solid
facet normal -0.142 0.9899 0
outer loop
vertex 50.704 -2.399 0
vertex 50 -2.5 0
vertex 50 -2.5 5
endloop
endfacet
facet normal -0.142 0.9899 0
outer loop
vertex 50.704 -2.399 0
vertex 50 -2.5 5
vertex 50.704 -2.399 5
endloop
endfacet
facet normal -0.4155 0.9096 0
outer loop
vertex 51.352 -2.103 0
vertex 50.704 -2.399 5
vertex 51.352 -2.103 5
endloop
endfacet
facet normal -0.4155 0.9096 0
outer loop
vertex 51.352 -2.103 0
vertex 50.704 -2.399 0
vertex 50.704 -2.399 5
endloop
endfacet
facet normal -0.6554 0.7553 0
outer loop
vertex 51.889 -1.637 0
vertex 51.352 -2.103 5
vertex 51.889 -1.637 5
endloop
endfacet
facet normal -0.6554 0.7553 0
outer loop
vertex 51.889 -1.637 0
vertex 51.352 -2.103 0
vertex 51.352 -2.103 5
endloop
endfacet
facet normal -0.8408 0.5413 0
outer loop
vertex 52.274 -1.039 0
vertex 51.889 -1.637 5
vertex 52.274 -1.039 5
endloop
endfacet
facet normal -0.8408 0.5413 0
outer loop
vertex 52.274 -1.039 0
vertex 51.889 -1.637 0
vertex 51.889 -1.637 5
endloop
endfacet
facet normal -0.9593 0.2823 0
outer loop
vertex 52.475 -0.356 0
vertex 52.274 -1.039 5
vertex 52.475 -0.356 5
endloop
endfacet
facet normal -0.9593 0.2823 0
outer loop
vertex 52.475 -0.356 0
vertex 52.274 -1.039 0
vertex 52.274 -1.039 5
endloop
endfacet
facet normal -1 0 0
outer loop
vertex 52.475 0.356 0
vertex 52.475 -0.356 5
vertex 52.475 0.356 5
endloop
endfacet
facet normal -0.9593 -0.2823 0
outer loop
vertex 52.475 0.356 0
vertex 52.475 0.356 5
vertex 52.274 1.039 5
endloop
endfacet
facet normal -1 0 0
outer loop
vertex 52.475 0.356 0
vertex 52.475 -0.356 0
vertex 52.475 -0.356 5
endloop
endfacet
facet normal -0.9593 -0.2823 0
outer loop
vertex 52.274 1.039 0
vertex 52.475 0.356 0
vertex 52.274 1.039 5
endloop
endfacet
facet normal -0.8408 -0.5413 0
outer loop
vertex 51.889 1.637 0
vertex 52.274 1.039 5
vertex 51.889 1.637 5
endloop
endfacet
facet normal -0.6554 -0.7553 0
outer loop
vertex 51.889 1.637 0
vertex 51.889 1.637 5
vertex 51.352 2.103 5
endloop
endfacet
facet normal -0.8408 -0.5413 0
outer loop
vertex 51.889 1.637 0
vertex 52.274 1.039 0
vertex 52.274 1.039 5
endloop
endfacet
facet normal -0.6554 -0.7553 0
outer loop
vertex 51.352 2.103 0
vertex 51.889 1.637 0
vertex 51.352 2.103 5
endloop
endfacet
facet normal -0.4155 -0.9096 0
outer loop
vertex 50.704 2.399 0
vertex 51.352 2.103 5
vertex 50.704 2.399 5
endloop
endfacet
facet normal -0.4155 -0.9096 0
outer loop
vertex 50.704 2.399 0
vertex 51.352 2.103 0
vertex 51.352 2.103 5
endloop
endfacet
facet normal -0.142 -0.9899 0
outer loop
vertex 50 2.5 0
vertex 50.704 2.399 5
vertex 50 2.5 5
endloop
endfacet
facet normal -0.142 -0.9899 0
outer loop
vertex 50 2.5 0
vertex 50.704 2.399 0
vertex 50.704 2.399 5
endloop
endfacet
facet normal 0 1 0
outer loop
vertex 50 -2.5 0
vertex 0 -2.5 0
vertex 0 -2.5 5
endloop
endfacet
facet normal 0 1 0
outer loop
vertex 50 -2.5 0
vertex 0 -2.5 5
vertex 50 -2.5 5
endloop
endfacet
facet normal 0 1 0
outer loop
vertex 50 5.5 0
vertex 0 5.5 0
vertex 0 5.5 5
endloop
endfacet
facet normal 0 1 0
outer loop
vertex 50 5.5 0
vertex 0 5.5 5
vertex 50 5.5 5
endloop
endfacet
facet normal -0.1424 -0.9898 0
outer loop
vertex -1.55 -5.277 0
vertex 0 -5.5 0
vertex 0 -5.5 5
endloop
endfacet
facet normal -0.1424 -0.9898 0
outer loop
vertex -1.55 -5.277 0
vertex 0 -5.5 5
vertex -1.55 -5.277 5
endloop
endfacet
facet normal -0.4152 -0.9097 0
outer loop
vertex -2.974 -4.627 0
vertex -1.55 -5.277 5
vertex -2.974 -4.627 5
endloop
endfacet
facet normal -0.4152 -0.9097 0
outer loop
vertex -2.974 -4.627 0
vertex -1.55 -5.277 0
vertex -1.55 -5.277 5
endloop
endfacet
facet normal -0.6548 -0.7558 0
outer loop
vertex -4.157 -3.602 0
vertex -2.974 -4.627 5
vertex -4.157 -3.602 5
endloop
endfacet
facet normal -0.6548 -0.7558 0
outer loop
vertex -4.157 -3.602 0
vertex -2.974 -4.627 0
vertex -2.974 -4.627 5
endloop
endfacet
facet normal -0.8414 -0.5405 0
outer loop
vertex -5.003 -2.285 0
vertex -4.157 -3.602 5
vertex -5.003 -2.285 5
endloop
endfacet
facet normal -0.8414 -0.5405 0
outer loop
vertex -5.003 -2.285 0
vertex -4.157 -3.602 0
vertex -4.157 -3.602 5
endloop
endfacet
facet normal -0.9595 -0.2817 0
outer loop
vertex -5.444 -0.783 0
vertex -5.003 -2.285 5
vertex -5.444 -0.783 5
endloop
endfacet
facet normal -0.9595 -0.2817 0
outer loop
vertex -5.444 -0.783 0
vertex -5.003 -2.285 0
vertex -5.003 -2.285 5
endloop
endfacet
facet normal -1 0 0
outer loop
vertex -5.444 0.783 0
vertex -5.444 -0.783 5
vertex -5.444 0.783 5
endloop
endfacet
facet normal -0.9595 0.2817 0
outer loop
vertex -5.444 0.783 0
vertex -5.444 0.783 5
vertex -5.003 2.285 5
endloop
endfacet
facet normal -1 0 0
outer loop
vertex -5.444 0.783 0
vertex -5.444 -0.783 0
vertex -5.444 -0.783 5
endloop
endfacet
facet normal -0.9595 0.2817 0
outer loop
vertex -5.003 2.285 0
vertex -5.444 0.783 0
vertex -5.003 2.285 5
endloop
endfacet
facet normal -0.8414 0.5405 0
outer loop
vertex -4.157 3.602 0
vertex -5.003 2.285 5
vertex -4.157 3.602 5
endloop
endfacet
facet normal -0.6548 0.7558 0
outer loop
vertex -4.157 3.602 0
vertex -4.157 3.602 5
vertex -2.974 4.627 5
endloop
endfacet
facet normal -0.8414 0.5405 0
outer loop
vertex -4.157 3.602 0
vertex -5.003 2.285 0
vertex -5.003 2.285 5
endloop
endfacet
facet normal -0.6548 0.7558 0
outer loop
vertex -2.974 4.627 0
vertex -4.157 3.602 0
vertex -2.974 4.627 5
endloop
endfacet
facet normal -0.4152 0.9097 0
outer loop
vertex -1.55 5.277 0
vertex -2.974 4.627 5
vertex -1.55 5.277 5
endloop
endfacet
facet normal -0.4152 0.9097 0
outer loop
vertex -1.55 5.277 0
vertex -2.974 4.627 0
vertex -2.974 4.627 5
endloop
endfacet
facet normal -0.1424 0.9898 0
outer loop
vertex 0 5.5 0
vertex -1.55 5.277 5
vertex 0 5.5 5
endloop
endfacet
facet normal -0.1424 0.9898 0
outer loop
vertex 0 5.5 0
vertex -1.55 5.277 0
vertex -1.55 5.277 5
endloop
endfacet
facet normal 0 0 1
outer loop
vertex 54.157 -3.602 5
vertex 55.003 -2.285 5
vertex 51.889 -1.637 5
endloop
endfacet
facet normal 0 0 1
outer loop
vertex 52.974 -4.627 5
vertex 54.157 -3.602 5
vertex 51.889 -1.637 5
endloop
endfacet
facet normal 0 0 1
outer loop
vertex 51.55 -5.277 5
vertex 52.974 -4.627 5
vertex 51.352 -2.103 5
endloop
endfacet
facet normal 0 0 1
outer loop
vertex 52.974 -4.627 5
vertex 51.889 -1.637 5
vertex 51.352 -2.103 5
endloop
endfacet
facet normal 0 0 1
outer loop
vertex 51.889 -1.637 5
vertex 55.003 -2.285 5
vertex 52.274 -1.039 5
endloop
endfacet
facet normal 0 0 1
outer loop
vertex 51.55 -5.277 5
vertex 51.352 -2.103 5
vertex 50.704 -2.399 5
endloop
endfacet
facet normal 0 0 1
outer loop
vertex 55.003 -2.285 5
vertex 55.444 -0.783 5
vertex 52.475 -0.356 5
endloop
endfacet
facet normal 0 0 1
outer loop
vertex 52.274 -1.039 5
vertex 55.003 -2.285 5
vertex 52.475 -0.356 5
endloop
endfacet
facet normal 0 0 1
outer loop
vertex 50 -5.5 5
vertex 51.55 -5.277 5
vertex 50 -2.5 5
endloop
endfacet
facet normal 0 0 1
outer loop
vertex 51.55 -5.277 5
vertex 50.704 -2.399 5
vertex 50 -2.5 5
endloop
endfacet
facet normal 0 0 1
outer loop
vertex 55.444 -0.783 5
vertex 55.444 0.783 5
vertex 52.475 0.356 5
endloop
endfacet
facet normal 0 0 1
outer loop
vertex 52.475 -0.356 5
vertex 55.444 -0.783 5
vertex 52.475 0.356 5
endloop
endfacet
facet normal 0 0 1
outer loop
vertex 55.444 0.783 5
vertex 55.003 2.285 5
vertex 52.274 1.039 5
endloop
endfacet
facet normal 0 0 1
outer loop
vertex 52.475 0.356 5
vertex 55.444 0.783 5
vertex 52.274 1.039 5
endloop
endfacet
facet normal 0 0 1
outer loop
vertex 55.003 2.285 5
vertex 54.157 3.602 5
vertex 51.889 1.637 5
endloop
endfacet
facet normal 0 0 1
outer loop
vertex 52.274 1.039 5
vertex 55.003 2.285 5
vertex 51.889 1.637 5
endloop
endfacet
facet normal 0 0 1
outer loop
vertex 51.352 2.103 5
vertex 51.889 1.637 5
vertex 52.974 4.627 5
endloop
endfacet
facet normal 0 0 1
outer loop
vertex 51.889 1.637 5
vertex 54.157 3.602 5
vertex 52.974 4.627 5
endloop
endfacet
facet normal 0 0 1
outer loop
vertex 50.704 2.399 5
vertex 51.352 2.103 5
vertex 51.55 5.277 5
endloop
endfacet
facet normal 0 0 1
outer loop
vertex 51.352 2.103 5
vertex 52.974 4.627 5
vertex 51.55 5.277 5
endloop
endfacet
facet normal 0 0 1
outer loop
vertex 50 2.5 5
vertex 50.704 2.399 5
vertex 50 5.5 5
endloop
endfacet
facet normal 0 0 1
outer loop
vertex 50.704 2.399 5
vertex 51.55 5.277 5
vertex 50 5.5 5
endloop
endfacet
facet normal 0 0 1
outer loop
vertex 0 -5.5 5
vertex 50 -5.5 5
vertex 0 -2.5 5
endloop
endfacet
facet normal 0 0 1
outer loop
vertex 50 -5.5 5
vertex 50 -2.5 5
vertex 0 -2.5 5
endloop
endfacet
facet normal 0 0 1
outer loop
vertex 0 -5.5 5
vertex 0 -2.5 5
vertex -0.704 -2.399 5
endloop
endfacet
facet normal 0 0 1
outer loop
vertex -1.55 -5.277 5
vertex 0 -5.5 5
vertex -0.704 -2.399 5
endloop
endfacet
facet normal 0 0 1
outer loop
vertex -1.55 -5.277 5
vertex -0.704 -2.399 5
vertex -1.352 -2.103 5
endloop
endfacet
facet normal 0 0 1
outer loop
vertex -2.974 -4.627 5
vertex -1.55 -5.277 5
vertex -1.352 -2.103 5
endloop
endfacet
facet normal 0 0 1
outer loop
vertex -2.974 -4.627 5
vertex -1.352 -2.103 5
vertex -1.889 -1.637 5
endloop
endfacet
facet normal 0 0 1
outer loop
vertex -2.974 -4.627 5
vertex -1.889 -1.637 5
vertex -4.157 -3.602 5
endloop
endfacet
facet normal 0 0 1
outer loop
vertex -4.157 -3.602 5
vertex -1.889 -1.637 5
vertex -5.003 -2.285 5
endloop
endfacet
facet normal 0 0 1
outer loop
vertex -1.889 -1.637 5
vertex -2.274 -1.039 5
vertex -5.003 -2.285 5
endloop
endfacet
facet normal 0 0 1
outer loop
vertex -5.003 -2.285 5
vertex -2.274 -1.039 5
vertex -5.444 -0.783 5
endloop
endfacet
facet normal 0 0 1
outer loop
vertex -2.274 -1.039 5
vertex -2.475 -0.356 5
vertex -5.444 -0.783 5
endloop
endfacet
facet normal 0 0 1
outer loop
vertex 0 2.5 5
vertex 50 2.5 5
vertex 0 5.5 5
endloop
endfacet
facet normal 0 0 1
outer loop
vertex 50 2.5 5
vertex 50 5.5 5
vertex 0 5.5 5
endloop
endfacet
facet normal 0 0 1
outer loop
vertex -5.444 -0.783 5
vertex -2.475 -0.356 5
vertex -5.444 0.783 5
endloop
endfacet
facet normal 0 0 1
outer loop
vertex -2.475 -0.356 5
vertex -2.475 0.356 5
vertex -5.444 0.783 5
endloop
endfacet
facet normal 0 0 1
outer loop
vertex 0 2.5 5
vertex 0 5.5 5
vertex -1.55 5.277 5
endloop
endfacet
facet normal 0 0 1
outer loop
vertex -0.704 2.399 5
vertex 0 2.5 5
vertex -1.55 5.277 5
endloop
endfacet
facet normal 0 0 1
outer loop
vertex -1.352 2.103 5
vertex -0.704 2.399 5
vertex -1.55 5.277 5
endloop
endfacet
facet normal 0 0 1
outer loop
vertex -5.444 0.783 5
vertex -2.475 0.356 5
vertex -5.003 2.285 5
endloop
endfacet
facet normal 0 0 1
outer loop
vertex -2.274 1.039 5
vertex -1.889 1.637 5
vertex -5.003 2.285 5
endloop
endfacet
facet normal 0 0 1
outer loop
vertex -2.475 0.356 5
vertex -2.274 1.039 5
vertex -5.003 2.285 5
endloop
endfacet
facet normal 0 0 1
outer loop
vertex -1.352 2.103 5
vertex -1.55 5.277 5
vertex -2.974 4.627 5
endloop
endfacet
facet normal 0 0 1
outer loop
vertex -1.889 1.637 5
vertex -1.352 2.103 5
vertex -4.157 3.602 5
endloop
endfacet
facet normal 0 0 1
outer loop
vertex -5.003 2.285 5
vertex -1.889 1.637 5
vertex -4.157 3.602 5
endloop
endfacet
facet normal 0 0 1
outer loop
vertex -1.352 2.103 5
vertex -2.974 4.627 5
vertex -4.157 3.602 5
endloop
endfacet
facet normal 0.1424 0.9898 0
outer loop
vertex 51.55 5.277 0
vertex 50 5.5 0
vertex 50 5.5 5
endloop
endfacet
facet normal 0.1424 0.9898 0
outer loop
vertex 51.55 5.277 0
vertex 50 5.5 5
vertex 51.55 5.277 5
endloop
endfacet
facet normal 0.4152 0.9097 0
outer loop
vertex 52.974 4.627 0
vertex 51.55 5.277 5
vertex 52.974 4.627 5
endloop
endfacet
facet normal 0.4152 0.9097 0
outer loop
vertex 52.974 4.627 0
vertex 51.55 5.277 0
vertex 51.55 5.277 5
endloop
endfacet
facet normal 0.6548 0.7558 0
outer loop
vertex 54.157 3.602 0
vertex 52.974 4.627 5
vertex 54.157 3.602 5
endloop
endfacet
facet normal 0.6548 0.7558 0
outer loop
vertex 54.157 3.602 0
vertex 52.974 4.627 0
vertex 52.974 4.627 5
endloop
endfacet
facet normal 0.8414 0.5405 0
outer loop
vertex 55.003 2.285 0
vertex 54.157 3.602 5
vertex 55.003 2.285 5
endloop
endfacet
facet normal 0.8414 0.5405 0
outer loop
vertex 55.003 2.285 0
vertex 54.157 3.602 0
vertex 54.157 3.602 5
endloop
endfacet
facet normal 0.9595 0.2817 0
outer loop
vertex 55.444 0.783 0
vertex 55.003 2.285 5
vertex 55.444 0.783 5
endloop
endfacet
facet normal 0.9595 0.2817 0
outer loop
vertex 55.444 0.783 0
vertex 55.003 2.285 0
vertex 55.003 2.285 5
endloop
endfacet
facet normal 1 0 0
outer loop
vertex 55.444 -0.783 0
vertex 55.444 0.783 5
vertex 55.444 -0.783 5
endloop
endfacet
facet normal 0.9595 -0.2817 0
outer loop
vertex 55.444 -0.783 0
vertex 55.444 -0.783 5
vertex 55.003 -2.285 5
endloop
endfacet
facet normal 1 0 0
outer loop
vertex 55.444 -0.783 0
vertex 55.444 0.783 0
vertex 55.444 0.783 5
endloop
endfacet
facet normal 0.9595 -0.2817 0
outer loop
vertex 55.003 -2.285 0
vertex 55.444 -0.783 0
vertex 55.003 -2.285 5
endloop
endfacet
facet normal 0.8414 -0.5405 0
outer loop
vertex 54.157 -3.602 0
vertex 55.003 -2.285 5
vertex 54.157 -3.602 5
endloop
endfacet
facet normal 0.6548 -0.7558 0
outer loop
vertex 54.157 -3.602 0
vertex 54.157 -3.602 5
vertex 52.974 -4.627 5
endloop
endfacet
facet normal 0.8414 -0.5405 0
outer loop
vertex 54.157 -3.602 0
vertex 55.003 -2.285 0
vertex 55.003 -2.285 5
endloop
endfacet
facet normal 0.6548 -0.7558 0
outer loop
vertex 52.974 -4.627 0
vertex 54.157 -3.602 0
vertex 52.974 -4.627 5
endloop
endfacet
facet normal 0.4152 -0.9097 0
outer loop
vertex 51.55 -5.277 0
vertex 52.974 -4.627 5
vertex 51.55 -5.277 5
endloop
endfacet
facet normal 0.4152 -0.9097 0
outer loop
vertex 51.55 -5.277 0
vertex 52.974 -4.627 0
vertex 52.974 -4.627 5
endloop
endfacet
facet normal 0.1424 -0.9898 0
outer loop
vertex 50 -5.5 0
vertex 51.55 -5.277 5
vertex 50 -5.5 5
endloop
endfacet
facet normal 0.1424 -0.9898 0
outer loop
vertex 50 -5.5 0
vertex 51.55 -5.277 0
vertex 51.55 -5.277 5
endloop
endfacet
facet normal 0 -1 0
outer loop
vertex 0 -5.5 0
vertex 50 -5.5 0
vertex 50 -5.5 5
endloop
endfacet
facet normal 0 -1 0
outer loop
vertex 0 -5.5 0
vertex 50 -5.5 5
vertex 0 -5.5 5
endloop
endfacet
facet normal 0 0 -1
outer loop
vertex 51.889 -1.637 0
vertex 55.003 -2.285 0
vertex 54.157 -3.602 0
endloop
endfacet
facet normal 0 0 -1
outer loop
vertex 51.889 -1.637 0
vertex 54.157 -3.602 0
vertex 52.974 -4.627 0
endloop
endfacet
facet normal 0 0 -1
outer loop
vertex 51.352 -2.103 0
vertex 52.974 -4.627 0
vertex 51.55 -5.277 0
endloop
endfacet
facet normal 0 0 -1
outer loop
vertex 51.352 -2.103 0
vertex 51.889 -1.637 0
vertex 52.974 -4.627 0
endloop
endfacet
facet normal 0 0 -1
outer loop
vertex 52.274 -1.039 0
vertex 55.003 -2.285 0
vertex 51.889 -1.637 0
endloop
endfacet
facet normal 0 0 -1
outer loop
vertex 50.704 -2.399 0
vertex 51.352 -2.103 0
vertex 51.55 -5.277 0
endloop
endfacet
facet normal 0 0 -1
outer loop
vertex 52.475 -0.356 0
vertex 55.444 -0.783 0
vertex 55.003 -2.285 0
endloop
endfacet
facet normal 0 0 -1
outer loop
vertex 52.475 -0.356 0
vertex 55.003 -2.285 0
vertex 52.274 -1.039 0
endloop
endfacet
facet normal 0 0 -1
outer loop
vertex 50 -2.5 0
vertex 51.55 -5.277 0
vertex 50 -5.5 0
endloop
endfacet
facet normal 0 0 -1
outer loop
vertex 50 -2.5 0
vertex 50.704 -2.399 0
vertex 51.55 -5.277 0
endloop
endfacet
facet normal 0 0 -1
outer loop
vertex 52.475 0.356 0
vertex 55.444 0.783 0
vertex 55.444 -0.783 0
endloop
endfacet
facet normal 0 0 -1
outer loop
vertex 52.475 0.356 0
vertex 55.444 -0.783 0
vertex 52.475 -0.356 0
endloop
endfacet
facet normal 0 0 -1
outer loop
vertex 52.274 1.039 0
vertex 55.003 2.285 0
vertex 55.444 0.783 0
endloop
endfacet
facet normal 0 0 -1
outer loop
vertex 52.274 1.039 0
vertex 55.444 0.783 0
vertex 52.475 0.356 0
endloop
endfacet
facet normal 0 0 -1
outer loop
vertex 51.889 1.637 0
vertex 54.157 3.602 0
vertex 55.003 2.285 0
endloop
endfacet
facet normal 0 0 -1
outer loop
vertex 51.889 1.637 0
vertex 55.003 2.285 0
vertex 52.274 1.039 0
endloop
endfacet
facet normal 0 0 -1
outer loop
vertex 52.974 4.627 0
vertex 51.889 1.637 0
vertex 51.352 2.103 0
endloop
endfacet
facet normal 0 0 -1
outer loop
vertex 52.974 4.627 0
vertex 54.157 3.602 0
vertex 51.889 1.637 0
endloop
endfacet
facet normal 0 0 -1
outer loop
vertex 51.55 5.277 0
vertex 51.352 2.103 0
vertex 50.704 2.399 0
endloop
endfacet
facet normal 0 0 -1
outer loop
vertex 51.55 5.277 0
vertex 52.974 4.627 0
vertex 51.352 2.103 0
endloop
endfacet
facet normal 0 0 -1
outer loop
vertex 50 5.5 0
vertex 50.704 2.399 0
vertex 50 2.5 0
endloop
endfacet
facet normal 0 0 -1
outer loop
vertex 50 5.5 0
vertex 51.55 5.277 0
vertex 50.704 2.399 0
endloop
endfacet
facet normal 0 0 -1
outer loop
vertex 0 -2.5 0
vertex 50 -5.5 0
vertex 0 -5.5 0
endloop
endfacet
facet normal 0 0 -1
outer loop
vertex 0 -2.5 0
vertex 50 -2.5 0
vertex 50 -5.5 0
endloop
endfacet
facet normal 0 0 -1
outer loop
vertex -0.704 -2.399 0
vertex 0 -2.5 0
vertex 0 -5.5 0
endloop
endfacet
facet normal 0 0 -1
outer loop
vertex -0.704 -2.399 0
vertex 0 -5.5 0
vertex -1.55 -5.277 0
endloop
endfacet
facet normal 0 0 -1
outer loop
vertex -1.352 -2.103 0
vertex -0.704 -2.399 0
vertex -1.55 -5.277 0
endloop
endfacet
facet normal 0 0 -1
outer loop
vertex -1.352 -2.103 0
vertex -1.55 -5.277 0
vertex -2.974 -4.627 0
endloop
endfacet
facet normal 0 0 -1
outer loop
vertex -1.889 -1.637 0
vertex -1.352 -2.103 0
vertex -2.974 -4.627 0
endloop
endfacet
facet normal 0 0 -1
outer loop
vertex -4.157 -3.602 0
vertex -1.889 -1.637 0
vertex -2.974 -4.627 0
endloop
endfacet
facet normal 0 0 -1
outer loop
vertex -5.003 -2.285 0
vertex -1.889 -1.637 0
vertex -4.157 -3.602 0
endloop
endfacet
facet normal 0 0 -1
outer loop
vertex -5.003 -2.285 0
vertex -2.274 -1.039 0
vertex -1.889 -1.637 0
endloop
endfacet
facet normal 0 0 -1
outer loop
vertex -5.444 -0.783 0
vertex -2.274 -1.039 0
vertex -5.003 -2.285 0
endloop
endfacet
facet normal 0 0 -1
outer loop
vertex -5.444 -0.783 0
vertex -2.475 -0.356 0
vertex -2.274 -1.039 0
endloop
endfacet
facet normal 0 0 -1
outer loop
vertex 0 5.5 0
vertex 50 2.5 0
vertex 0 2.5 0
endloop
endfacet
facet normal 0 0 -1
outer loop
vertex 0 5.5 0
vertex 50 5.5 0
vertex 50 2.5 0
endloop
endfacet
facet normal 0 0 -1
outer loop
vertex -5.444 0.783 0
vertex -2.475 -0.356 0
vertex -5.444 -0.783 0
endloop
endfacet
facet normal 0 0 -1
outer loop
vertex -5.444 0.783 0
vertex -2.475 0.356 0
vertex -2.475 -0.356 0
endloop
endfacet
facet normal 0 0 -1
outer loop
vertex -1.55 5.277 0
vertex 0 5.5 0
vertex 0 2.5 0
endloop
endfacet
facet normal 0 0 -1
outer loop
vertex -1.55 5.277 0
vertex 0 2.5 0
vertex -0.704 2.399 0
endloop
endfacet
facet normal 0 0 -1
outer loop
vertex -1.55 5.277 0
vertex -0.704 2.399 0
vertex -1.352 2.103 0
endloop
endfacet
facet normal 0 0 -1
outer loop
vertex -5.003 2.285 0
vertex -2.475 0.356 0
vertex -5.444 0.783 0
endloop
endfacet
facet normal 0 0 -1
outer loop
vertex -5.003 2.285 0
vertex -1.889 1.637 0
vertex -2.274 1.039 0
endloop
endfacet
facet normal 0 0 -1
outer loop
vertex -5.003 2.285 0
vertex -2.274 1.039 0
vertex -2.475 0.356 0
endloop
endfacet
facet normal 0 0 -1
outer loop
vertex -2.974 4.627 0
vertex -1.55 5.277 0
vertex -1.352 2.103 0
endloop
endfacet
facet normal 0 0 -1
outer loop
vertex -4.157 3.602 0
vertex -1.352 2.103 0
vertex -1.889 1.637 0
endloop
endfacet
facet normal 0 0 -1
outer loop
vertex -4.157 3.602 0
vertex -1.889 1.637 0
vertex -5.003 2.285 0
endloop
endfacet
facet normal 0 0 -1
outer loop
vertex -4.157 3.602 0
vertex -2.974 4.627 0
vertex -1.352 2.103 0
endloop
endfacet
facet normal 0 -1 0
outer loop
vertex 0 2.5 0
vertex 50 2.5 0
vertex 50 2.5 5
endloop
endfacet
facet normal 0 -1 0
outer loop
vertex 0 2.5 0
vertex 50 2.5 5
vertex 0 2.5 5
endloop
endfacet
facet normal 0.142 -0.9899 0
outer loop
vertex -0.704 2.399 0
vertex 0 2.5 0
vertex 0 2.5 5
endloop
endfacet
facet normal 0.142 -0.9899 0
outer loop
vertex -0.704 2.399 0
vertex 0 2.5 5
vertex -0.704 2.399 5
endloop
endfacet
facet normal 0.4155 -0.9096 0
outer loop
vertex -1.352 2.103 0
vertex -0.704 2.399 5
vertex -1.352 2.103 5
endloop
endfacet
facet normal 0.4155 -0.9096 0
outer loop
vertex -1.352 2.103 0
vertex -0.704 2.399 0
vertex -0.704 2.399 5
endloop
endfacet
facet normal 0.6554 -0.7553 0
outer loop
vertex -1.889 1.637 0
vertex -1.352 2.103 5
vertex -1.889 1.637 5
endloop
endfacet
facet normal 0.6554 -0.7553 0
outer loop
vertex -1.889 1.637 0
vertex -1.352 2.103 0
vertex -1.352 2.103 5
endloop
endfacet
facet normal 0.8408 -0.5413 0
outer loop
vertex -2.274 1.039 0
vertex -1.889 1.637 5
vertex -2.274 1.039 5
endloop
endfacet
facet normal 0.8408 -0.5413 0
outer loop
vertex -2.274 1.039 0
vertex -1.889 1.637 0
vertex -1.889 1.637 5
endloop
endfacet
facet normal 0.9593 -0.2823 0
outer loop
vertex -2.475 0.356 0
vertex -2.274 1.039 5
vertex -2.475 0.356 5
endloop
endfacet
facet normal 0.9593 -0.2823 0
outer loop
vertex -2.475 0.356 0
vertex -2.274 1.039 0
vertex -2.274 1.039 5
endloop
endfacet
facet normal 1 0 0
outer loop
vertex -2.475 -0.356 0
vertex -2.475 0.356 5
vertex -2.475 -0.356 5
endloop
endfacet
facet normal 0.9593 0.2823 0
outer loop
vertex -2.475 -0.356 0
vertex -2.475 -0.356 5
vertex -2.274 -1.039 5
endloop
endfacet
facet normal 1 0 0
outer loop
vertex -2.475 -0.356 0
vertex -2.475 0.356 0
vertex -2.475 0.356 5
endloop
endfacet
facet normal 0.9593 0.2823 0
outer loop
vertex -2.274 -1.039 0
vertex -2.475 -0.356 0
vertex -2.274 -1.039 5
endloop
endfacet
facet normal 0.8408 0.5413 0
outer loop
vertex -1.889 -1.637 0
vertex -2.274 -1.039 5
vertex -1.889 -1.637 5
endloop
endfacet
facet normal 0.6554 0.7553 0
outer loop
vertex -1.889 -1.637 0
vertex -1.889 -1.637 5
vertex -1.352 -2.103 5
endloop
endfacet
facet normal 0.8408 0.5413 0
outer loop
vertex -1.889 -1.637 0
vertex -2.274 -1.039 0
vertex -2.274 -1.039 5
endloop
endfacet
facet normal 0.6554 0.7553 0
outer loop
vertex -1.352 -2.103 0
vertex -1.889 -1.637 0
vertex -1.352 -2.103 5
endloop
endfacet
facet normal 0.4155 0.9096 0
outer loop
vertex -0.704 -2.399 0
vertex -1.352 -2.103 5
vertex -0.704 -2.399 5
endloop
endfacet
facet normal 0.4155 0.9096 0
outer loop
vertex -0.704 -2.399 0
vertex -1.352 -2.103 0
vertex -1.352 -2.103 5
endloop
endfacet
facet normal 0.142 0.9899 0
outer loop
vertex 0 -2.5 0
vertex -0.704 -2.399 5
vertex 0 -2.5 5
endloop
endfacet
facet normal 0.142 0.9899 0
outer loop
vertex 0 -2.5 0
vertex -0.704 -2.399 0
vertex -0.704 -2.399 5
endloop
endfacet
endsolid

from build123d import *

# Parameters (mm, degrees)
BOSS_EXTRUDE1_DEPTH = 5


with BuildPart() as part:
    # Sketch2 → Boss-Extrude1 (new body)
    with BuildSketch(Plane.XY):
        with BuildLine():
            Line((0, 5.5), (50, 5.5))
            ThreePointArc((50, 5.5), (55.5, 0), (50, -5.5))
            Line((50, -5.5), (0, -5.5))
            ThreePointArc((0, -5.5), (-5.5, 0), (0, 5.5))
        make_face()
        with BuildLine():
            ThreePointArc((50, -2.5), (52.5, 0), (50, 2.5))
            Line((50, 2.5), (0, 2.5))
            ThreePointArc((0, 2.5), (-2.5, 0), (0, -2.5))
            Line((0, -2.5), (50, -2.5))
        make_face(mode=Mode.SUBTRACT)
    extrude(amount=BOSS_EXTRUDE1_DEPTH)


solid = part.part
